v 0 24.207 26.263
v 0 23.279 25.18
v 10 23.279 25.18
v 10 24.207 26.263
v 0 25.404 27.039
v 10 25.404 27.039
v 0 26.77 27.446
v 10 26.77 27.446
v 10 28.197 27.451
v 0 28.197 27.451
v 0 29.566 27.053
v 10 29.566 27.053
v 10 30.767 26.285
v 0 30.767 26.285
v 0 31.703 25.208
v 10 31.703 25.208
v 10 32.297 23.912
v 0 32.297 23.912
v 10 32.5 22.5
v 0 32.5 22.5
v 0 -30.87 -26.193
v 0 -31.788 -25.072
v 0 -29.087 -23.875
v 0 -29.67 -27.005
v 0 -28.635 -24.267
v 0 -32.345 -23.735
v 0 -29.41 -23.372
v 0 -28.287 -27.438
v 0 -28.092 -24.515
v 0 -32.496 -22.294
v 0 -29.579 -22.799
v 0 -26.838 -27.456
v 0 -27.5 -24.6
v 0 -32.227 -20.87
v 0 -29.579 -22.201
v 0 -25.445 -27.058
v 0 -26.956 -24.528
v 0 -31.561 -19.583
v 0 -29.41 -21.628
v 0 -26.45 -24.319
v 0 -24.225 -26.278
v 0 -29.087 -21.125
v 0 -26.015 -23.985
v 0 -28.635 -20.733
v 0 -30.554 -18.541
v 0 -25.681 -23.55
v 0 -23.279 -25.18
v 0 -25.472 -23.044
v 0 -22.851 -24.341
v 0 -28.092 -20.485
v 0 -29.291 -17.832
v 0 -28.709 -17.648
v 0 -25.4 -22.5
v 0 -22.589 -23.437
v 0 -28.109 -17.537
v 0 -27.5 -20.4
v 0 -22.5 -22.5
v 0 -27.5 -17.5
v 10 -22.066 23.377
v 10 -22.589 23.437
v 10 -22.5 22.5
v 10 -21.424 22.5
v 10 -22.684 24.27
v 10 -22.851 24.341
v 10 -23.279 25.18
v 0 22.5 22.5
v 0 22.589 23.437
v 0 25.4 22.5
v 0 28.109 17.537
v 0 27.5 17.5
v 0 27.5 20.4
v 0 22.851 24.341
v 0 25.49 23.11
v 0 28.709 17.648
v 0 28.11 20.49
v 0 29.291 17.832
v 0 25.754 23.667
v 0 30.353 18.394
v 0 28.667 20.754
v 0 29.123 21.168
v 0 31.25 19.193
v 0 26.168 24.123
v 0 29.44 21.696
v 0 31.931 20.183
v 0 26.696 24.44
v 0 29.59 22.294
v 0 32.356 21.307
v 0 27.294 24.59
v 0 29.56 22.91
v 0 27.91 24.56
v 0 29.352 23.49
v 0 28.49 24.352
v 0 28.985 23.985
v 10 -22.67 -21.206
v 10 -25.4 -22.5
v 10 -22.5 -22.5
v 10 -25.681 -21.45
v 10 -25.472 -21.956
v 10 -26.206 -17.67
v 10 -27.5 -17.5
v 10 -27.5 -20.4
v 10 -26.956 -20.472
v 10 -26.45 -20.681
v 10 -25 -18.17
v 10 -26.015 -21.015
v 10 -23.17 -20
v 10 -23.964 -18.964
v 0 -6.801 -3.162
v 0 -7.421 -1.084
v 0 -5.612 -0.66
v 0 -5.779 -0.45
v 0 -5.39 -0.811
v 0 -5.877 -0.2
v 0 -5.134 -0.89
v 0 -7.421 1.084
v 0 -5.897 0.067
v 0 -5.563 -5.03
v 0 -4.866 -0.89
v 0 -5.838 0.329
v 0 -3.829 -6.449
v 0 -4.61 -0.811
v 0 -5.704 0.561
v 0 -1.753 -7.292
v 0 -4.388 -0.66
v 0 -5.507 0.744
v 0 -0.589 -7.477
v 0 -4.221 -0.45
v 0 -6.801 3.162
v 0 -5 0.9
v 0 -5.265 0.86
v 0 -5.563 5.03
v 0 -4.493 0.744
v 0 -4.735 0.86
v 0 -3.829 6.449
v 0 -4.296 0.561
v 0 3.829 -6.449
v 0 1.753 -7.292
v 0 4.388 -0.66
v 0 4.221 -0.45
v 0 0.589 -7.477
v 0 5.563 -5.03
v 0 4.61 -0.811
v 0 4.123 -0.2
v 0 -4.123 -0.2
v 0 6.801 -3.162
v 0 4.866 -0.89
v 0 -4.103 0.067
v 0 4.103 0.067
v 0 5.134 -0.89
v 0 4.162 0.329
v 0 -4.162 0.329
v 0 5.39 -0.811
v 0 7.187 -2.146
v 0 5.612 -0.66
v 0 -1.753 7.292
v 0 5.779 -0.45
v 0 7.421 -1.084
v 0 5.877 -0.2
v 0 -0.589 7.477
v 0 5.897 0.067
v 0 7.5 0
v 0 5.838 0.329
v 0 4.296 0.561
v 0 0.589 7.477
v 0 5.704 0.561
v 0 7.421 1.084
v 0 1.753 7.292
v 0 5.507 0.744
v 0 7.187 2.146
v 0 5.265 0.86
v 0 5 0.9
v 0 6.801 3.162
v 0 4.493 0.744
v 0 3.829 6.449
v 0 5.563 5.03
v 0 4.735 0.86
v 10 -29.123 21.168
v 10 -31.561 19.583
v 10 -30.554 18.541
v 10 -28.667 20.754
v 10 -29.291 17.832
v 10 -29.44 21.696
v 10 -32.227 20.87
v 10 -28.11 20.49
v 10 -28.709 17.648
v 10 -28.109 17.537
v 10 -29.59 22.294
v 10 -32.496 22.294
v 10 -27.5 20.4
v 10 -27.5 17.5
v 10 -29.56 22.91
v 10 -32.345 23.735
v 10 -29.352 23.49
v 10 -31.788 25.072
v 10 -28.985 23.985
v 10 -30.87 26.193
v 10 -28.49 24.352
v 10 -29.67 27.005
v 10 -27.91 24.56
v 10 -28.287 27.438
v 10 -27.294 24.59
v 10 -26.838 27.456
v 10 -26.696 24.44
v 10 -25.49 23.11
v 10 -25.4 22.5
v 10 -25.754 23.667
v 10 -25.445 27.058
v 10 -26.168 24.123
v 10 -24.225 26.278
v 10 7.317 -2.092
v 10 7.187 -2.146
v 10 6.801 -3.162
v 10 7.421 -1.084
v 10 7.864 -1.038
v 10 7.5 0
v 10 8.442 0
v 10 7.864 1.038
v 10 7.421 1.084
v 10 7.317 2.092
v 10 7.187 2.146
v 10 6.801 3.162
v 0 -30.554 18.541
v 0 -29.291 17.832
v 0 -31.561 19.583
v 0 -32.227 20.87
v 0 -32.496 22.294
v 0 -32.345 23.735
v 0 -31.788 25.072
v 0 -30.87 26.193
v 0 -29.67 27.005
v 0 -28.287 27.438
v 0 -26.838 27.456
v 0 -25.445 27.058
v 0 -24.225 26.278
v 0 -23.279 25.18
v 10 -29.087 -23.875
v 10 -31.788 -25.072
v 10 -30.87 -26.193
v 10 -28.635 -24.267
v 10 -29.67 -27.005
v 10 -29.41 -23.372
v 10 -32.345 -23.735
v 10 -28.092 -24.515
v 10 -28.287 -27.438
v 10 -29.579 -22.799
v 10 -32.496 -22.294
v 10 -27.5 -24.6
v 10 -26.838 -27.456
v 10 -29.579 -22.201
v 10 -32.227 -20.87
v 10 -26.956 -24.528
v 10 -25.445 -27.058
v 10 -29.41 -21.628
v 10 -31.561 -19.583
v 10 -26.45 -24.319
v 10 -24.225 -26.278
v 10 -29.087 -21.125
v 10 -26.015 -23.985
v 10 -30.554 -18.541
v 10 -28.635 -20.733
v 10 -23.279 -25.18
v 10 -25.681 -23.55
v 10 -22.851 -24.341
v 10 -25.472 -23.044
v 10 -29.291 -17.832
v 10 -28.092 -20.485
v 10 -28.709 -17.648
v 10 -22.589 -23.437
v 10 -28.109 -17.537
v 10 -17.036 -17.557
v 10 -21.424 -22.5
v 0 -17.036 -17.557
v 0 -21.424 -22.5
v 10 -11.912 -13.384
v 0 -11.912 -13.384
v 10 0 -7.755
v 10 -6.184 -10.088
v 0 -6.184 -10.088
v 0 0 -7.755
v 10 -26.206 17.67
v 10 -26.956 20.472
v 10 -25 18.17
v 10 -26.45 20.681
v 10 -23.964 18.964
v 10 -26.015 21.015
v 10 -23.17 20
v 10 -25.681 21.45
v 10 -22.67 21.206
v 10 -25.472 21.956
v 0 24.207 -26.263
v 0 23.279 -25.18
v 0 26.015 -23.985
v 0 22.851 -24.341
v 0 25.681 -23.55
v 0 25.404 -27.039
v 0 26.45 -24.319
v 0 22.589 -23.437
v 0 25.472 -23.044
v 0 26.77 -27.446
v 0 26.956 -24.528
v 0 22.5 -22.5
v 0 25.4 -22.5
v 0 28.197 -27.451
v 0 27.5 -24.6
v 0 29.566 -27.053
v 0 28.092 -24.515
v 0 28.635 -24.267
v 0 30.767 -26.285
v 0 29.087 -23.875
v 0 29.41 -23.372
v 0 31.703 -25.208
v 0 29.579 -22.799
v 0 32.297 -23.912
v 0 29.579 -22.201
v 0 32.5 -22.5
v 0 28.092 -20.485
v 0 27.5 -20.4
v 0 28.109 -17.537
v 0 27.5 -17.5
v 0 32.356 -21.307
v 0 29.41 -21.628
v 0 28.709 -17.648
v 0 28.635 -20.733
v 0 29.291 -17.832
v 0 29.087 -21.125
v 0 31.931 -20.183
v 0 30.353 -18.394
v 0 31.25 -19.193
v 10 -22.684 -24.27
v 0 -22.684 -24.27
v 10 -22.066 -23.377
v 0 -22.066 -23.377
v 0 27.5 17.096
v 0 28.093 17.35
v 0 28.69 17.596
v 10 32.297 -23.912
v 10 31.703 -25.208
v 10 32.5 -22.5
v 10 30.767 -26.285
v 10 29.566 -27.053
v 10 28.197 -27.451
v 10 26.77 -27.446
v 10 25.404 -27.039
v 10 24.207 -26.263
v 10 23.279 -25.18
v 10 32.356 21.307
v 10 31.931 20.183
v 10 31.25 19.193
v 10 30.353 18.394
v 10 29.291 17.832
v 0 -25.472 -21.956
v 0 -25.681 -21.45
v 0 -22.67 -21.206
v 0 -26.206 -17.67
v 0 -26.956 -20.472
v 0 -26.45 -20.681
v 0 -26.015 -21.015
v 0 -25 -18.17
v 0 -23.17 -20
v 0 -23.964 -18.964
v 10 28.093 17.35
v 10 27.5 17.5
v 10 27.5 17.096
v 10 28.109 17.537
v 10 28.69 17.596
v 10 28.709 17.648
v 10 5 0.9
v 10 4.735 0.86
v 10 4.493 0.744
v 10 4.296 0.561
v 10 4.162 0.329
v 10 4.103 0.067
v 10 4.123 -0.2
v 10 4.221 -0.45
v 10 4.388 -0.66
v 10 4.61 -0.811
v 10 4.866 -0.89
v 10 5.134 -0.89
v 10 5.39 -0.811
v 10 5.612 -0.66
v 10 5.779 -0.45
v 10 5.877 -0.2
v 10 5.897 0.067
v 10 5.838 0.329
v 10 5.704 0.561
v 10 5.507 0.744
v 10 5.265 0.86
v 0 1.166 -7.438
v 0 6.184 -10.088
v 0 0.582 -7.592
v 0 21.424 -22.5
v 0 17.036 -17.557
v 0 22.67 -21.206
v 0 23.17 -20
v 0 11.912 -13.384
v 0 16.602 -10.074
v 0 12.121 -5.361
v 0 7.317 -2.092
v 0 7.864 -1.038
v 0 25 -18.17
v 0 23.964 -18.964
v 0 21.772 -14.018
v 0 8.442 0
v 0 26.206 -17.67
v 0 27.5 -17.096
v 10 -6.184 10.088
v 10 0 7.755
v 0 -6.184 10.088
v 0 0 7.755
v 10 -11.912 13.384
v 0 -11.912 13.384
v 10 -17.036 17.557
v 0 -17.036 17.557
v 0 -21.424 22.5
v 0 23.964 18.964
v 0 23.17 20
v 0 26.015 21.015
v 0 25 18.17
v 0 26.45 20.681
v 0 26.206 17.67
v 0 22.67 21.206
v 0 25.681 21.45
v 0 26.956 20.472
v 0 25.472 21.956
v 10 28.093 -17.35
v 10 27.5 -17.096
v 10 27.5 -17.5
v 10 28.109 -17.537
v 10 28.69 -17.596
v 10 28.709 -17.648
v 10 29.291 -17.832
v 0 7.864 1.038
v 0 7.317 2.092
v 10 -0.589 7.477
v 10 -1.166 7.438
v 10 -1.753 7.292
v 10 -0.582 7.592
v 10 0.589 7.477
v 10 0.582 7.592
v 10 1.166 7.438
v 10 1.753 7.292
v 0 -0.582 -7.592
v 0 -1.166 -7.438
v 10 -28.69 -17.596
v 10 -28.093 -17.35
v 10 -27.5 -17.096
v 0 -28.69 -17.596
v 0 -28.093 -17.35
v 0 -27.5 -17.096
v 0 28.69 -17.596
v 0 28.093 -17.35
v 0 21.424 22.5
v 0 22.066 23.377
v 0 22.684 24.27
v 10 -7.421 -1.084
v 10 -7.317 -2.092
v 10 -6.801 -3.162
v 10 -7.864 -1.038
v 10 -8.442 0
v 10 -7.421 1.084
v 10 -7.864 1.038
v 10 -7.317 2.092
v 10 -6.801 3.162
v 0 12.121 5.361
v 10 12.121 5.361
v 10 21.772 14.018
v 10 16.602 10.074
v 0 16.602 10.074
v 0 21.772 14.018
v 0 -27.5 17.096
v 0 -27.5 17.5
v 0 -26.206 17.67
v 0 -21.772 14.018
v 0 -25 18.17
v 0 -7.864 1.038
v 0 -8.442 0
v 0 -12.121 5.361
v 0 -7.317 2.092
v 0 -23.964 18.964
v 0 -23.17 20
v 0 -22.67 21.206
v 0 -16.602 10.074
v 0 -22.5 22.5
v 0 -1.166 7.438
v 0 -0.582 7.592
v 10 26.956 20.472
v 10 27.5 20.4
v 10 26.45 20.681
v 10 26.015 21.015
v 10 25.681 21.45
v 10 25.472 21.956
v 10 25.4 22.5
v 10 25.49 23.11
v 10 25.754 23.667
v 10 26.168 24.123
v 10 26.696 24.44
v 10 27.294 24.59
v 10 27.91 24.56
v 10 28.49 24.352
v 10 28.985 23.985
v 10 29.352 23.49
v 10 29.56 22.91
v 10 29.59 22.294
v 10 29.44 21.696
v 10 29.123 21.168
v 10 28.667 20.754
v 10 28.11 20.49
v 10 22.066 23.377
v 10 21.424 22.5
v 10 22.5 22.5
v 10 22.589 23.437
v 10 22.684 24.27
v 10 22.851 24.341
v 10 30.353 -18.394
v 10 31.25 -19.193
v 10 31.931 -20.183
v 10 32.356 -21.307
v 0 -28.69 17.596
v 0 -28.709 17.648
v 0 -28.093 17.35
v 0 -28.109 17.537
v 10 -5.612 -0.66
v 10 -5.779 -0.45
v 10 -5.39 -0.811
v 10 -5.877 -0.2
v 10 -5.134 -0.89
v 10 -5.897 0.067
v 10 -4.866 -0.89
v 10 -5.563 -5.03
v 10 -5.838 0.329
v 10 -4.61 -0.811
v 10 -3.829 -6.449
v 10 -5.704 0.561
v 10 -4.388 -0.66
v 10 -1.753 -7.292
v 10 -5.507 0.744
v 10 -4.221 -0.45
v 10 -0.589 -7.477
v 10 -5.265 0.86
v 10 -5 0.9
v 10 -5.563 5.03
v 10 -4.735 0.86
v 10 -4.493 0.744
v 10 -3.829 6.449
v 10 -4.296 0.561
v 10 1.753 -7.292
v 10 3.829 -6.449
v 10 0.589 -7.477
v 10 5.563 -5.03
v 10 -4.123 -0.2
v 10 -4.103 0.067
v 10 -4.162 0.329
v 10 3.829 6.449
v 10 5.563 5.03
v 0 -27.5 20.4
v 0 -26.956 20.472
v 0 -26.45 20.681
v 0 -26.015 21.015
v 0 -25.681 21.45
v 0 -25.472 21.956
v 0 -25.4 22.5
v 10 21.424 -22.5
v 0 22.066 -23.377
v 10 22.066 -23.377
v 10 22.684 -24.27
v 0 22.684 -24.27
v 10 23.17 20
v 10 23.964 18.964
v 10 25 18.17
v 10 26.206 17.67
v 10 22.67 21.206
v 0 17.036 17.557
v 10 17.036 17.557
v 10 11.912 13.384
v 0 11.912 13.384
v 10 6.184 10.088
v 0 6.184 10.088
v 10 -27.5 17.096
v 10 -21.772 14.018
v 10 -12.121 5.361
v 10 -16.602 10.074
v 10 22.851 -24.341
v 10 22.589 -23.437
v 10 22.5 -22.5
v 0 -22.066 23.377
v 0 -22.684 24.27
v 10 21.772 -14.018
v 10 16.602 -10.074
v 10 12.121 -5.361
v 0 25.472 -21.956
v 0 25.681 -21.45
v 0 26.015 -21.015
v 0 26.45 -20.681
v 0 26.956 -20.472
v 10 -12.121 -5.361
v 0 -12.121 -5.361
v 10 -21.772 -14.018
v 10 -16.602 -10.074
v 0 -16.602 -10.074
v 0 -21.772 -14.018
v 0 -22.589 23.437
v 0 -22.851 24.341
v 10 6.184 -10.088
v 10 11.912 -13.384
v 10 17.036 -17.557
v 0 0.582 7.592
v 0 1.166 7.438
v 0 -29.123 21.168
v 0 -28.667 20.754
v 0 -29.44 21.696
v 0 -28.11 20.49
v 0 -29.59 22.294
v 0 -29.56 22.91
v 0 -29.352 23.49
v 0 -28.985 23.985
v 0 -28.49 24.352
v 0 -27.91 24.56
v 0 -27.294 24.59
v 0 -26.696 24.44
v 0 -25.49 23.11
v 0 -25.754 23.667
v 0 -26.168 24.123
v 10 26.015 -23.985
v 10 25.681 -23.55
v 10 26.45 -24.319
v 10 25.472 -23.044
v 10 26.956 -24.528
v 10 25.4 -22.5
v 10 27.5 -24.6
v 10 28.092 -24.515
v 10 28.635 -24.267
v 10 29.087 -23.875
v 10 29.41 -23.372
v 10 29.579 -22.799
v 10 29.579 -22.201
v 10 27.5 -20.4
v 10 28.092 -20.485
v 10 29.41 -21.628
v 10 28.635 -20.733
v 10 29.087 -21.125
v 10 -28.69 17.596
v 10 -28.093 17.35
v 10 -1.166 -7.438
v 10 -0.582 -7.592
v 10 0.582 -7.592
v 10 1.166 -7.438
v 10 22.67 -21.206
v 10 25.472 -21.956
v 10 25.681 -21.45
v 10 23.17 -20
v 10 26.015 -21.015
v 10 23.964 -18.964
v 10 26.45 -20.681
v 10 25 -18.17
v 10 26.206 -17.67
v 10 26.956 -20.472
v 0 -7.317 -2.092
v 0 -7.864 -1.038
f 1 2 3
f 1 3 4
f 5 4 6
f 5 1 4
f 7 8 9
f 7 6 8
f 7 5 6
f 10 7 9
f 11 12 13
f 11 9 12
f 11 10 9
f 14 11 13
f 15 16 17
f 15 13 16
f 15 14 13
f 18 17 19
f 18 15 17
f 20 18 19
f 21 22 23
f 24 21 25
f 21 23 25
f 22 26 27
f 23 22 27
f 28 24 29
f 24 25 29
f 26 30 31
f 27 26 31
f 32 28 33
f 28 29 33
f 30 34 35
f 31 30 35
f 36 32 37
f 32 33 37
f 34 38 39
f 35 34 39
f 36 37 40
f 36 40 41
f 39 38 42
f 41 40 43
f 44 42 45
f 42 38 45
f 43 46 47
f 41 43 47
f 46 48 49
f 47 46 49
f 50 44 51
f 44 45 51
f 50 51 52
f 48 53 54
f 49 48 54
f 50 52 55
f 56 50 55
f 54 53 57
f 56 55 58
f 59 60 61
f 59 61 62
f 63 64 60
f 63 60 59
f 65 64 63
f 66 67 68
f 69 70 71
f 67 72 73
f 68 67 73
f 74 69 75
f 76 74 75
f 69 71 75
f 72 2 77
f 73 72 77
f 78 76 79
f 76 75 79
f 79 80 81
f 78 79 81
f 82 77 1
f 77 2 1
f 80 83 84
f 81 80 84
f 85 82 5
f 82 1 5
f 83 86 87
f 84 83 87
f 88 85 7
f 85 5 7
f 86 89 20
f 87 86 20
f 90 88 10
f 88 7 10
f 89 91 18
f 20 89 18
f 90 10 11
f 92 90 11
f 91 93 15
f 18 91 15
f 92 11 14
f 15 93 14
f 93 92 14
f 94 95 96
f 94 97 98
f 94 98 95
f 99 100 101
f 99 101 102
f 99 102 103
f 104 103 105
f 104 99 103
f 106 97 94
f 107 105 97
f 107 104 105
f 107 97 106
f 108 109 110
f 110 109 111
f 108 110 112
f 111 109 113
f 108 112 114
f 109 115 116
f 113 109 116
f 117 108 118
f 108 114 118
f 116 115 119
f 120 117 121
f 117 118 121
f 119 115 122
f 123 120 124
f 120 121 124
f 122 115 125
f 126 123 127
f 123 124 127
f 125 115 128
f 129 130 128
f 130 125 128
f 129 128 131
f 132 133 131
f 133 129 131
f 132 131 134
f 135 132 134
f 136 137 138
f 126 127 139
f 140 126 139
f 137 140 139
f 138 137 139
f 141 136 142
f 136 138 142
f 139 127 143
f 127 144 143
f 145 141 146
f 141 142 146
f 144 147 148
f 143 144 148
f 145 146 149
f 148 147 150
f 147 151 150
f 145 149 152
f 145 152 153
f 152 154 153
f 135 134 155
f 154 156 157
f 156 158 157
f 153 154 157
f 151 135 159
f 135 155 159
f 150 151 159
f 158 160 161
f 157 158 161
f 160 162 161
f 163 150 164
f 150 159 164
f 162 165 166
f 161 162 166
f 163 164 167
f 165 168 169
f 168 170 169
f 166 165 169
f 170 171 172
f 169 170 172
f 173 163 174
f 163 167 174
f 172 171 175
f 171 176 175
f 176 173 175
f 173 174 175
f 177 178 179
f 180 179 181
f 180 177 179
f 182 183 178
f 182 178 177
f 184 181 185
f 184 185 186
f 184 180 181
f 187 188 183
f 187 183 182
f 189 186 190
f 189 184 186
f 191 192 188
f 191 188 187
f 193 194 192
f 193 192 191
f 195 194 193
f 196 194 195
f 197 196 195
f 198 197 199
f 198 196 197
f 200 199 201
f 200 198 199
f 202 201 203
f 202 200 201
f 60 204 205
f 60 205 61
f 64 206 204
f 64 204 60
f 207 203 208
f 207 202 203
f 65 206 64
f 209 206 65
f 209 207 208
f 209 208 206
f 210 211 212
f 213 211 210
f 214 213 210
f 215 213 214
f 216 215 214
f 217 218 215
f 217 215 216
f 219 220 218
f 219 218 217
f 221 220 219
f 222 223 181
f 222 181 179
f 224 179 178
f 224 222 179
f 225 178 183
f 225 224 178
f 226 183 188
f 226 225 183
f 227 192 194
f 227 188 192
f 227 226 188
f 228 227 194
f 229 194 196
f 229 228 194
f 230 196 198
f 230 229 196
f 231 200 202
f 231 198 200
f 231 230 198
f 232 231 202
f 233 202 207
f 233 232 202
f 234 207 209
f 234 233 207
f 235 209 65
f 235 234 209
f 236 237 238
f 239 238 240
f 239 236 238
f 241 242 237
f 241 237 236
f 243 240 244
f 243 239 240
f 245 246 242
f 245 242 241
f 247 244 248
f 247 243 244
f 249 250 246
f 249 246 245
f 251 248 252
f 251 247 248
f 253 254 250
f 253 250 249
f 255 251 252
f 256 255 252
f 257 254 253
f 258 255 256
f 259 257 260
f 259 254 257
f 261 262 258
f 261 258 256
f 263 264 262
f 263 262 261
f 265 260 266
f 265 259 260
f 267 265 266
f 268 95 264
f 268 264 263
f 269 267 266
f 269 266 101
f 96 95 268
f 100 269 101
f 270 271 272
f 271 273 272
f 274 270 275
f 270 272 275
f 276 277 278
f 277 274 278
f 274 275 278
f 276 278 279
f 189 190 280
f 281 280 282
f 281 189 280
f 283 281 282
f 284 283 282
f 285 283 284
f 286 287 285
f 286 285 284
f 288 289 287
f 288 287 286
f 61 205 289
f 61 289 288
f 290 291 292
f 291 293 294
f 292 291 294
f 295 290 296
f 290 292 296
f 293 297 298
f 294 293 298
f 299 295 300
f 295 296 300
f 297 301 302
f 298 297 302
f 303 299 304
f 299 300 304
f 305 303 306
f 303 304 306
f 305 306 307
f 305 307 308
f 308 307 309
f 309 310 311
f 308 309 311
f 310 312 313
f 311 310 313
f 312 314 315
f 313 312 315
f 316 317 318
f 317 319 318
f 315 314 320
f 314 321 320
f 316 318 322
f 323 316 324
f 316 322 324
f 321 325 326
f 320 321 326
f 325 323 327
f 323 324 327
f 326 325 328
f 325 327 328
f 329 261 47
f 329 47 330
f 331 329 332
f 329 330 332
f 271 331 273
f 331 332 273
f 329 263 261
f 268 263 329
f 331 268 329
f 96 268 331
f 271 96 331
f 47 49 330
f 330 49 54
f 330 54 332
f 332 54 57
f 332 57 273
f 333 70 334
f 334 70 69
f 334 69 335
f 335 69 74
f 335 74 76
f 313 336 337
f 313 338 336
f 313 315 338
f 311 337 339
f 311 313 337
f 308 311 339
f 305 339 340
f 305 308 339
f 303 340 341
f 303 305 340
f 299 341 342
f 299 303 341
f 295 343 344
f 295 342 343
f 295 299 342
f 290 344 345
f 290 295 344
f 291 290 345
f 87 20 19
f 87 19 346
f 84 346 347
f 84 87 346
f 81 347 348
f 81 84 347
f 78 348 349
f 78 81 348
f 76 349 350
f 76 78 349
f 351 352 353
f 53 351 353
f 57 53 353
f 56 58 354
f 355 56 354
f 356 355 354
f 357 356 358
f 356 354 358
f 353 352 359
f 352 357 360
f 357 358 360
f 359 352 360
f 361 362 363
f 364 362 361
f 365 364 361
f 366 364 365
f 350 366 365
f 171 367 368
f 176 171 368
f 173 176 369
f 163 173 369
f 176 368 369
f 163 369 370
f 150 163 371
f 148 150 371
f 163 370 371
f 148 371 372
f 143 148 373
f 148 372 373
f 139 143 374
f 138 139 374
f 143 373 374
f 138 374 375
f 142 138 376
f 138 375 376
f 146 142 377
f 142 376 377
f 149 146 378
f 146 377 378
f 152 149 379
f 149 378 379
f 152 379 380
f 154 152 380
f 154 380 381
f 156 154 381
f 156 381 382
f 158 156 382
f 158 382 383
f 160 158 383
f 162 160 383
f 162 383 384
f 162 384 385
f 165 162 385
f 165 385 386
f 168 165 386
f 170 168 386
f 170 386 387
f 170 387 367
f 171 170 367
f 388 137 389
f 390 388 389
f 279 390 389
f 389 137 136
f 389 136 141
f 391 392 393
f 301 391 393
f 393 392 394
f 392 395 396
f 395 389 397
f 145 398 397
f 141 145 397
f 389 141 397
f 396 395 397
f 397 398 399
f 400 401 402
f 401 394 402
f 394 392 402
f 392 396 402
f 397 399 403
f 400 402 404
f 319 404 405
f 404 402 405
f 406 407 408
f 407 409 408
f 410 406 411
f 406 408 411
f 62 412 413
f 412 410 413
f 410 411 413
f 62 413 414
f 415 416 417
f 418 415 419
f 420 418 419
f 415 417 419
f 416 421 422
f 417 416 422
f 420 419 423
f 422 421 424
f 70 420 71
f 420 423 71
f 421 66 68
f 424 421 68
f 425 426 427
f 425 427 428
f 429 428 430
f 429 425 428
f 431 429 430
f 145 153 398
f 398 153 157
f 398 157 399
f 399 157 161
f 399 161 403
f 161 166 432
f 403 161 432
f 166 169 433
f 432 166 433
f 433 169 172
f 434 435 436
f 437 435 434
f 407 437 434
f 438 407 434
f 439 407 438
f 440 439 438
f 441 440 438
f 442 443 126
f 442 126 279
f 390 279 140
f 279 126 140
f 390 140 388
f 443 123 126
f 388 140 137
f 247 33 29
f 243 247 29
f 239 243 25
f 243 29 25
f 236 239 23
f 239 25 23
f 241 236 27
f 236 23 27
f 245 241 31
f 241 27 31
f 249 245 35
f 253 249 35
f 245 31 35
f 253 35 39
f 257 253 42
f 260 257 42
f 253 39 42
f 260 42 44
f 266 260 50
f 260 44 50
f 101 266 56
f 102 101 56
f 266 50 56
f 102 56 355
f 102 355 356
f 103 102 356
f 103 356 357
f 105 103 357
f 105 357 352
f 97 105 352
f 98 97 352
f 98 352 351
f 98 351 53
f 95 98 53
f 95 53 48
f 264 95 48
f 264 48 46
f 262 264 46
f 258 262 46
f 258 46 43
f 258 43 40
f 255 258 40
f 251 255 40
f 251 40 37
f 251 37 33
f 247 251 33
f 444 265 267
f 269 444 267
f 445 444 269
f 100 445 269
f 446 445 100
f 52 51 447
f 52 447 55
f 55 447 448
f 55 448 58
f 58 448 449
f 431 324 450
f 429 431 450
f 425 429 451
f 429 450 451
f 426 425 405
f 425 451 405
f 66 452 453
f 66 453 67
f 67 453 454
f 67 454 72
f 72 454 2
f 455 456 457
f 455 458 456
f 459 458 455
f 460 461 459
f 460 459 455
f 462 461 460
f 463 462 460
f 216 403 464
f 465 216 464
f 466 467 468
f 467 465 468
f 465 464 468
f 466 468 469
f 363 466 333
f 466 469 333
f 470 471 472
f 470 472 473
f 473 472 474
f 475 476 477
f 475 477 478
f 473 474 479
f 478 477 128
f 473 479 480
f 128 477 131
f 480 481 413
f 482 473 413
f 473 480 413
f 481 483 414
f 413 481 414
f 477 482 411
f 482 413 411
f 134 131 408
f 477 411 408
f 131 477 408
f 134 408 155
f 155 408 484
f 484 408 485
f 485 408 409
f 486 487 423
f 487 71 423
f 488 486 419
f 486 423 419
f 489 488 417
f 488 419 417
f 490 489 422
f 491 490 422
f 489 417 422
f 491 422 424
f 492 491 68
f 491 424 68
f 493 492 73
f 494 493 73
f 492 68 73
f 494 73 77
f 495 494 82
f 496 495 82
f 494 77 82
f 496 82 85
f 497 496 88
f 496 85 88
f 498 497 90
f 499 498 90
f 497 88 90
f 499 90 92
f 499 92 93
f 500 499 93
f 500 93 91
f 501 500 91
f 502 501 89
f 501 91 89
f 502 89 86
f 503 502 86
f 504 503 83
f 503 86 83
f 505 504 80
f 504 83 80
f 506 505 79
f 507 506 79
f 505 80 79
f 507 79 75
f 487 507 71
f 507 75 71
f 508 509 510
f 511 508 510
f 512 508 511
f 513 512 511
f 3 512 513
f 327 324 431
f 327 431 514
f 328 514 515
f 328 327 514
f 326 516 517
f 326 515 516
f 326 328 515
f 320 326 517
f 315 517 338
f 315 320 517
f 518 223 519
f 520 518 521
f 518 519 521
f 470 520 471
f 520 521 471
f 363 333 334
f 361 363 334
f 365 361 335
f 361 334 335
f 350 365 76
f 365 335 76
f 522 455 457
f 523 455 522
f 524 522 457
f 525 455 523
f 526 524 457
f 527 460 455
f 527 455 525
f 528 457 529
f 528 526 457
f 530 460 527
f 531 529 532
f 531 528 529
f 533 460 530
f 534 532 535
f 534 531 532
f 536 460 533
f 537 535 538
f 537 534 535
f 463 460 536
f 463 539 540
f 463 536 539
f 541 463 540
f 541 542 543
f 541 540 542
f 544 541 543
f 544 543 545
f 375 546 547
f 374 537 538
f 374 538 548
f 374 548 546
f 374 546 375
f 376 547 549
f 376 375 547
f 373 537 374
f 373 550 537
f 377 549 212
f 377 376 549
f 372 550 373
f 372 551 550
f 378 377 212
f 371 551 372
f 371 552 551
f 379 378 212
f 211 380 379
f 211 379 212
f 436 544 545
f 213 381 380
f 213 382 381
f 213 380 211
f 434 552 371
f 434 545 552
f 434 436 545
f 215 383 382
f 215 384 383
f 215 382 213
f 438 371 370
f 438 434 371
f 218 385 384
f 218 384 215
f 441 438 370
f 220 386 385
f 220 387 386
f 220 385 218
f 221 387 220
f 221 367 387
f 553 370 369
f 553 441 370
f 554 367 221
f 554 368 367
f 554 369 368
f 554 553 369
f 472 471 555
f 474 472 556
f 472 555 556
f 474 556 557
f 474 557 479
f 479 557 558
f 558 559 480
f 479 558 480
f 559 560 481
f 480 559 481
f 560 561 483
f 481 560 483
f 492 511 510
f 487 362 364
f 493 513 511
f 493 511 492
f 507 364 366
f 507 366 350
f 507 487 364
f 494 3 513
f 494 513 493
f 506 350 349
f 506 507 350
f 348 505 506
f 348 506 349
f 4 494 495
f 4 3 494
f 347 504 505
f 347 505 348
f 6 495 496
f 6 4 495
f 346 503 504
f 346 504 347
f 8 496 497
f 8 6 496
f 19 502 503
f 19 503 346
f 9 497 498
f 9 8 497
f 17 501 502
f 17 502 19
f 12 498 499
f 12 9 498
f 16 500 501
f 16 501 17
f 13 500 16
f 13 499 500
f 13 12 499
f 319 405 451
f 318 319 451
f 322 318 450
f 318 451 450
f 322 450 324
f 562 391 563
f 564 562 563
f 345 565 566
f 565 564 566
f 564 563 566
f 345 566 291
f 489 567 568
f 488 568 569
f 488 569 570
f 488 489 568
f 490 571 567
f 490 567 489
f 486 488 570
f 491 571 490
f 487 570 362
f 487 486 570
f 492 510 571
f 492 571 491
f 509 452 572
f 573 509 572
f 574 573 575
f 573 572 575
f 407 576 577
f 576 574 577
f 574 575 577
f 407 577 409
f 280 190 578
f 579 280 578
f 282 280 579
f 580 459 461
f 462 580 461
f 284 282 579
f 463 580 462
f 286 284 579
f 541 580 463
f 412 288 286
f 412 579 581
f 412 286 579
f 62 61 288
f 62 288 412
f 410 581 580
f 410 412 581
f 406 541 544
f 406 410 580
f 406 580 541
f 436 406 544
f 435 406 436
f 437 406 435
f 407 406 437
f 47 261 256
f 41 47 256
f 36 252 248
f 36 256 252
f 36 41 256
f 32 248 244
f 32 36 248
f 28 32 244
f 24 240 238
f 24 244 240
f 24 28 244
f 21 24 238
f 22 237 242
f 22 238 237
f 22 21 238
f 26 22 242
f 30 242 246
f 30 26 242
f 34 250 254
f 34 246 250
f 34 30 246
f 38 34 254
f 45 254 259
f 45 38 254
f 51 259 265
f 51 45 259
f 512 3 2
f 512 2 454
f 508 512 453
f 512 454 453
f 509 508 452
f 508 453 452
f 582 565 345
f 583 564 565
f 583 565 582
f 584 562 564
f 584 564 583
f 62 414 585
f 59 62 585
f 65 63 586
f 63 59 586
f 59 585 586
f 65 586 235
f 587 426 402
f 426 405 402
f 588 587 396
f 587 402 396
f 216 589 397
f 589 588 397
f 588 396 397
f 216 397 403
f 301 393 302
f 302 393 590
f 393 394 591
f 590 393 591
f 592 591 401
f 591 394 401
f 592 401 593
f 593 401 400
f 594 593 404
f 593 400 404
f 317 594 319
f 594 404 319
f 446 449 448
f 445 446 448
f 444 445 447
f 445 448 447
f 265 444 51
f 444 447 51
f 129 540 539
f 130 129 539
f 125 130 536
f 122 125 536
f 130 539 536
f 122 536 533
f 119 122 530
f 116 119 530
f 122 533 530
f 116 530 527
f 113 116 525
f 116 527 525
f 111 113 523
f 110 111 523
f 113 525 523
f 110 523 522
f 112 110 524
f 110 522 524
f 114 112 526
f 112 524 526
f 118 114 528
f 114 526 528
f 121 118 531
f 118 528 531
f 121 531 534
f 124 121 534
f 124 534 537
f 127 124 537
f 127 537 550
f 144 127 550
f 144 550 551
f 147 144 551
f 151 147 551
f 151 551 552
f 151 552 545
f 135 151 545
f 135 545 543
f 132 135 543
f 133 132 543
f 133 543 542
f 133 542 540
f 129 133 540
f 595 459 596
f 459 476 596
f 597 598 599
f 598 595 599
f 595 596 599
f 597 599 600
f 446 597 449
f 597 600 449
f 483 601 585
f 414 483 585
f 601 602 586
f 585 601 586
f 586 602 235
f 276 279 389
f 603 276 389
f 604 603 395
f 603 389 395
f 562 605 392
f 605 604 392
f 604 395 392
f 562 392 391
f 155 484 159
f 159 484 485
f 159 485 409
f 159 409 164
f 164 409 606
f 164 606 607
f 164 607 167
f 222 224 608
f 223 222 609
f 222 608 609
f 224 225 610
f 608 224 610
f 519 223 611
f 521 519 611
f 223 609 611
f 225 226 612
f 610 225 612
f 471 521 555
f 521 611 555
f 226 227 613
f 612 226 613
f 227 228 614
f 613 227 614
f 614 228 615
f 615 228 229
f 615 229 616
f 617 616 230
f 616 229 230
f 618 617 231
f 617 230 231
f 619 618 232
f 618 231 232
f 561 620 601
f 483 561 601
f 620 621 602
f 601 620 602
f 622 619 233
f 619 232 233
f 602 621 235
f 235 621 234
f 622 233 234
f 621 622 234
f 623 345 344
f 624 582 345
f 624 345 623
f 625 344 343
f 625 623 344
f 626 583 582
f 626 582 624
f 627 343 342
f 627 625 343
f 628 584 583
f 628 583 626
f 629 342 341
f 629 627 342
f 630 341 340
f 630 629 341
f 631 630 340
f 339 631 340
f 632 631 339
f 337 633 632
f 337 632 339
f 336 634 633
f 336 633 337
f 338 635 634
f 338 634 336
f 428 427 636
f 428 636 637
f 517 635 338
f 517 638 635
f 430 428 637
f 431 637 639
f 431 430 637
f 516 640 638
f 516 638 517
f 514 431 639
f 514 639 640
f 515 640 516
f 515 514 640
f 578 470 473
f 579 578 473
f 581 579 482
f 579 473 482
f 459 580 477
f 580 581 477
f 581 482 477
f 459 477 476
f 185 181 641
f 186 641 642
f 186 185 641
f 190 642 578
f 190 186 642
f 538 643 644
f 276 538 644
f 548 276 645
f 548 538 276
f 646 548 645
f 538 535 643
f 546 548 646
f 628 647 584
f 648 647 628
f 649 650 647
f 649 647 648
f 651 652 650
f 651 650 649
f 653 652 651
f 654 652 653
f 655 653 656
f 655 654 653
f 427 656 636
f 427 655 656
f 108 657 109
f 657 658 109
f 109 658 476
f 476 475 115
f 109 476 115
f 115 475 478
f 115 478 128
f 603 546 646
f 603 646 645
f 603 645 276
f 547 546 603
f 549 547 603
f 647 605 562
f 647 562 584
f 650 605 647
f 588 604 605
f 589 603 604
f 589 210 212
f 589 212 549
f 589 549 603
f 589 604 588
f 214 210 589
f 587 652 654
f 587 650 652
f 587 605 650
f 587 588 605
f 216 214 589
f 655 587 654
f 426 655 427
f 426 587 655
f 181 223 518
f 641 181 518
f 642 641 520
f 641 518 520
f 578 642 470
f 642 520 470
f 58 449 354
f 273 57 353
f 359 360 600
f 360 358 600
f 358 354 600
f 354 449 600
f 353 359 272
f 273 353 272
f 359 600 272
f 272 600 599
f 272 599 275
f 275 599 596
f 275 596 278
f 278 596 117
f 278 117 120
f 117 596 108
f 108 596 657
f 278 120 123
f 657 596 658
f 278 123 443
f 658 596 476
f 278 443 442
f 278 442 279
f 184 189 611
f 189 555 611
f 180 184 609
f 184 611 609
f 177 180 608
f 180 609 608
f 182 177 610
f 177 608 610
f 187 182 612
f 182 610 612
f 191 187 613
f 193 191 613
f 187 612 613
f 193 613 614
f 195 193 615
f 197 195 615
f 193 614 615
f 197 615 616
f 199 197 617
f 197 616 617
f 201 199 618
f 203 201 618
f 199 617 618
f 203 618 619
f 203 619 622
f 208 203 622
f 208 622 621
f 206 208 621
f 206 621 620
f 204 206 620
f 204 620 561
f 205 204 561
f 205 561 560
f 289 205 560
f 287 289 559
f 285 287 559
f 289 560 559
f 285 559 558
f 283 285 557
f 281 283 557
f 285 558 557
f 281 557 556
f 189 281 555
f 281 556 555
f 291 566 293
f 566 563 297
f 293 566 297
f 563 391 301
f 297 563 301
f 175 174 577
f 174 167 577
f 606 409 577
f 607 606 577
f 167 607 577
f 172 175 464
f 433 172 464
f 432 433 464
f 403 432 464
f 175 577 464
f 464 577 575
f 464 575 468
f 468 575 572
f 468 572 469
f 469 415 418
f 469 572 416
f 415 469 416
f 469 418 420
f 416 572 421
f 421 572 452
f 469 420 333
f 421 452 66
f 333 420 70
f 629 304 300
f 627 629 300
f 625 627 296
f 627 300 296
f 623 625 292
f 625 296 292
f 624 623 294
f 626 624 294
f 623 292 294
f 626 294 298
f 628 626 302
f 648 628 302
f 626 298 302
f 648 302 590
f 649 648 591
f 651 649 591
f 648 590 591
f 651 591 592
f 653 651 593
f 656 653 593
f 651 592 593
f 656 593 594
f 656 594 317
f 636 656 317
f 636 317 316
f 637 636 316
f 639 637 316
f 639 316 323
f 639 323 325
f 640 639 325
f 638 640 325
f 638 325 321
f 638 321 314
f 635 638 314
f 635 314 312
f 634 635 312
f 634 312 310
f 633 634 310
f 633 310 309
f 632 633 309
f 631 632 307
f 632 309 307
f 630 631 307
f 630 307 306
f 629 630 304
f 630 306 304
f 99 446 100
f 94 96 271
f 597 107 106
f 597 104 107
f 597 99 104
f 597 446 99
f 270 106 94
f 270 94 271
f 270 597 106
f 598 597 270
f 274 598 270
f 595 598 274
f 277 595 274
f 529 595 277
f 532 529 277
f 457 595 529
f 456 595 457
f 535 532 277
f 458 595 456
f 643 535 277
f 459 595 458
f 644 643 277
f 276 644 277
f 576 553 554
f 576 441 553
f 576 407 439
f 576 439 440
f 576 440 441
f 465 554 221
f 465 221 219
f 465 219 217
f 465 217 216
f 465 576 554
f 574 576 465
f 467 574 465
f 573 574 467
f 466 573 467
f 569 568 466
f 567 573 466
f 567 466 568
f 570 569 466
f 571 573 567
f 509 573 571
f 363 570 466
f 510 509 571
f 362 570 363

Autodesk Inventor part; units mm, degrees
ref_plane "YZ Plane" through (0, 0, 0) normal (1, 0, 0) x (0, 1, 0)
ref_plane "XZ Plane" through (0, 0, 0) normal (0, 1, 0) x (-1, 0, 0)
ref_plane "XY Plane" through (0, 0, 0) normal (0, 0, 1) x (1, 0, 0)
sketch "Sketch1" plane through (0, 0, 0) normal (1, 0, 0) x (0, 1, 0)
  line L0 (-27.5, 22.5) -> (27.5, 22.5)
  line L1 (27.5, 22.5) -> (27.5, -22.5)
  line L2 (27.5, -22.5) -> (-27.5, -22.5)
  line L3 (-27.5, -22.5) -> (-27.5, 22.5)
  line L4 (-27.5, 22.5) -> (27.5, -22.5) construction
  line L5 (27.5, 22.5) -> (-27.5, -22.5) construction
  circle A0 centre (27.5, 22.5) radius 5
  circle A1 centre (27.5, -22.5) radius 5
  line L6 (0, -22.5) -> (0, 22.5) construction
  circle A2 centre (0, 0) radius 7.5
  arc A3 (29.2912, 17.8319) -> (6.8009, -3.1619) centre (43.9793, -20.4469) ccw
  arc A4 (-1.7526, 7.2924) -> (23.279, 25.1801) centre (-11.3332, 47.1573) ccw
  line L7 (27.5, 0) -> (-27.5, 0) construction
  arc A5 (6.8009, 3.1619) -> (29.2912, -17.8319) centre (43.9793, 20.4469) ccw
  arc A6 (23.279, -25.1801) -> (-1.7526, -7.2924) centre (-11.3332, -47.1573) ccw
  circle A7 centre (-27.5, 22.5) radius 5
  circle A8 centre (-27.5, -22.5) radius 5
  arc A9 (-6.8009, -3.1619) -> (-29.2912, 17.8319) centre (-43.9793, -20.4469) ccw
  arc A10 (-23.279, 25.1801) -> (1.7526, 7.2924) centre (11.3332, 47.1573) ccw
  arc A11 (-29.2912, -17.8319) -> (-6.8009, 3.1619) centre (-43.9793, 20.4469) ccw
  arc A12 (1.7526, -7.2924) -> (-23.279, -25.1801) centre (11.3332, -47.1573) ccw
  point P0 (23.279, 25.1801)
  point P1 (0, 7.7548)
  point P2 (-23.279, 25.1801)
  point P3 (-8.4416, 0)
  point P4 (-29.2912, -17.8319)
  point P5 (-23.279, -25.1801)
  point P6 (0, -7.7548)
  point P7 (23.279, -25.1801)
  point P8 (29.2912, -17.8319)
  point P9 (8.4416, 0)
  dimension "d3" = 15
  dimension "d0" = 55
  dimension "d1" = 45
  dimension "d2" = 10
  dimension "d4" = 41
extrude "Extrusion1" add sketch "Sketch1" along normal blind 10 contours L3 A7 L0 | L0 A7 L3 | A7 A10 L0 | L0 A10 A4 A2 A11 A9 L3 A7 | L3 A9 A7 | A4 A0 L0 | L0 A0 L1 A3 A5 A2 A10 A4 | A10 A2 A4 | A11 A9 A2 A6 A12 L2 A8 L3 | L3 A8 A11 | A11 A2 A9 | A0 L1 L0 | L0 L1 A0 | A2 | A8 L2 L3 | L3 L2 A8 | A0 A3 L1 | A5 A3 A2 | L2 A12 A8 | A2 A12 A6 | A5 L1 A1 L2 A6 A12 A2 A3 | A5 A1 L1 | L2 A1 A6 | A1 L2 L1 | L1 L2 A1
sketch "Sketch2" plane through (10, 0, 0) normal (1, 0, 0) x (0, 0, -1)
  arc A0 (-25.1801, -23.279) -> (-7.7548, 0) centre (-47.1573, 11.3332) ccw projected
  arc A1 (-25.1801, -23.279) -> (-17.8319, -29.2912) centre (-22.5, -27.5) ccw projected
  arc A2 (0, -8.4416) -> (-17.8319, -29.2912) centre (20.4469, -43.9793) ccw projected
  arc A3 (17.8319, -29.2912) -> (0, -8.4416) centre (-20.4469, -43.9793) ccw projected
  arc A4 (17.8319, -29.2912) -> (25.1801, -23.279) centre (22.5, -27.5) ccw projected
  arc A5 (7.7548, 0) -> (25.1801, -23.279) centre (47.1573, 11.3332) ccw projected
  arc A6 (25.1801, 23.279) -> (7.7548, 0) centre (47.1573, -11.3332) ccw projected
  arc A7 (25.1801, 23.279) -> (17.8319, 29.2912) centre (22.5, 27.5) ccw projected
  arc A8 (0, 8.4416) -> (17.8319, 29.2912) centre (-20.4469, 43.9793) ccw projected
  arc A9 (-17.8319, 29.2912) -> (0, 8.4416) centre (20.4469, 43.9793) ccw projected
  arc A10 (-17.8319, 29.2912) -> (-25.1801, 23.279) centre (-22.5, 27.5) ccw projected
  arc A11 (-7.7548, 0) -> (-25.1801, 23.279) centre (-47.1573, -11.3332) ccw projected
  point P0 (0, 0)
hole "Hole1" at (10, 27.5, 22.5) at (10, -27.5, 22.5) at (10, -27.5, -22.5) at (10, 27.5, -22.5) direction (-1, 0, 0) diameter 4.2 end through all
sketch "Sketch3" plane through (0, 0, 0) normal (-1, 0, 0) x (0, 0, 1)
  line L0 (0, 5) -> (0, -5)
  line L1 (0, 0) -> (4.5458, 0) construction
  dimension "d14" = 10
hole "Hole2" at (0, 5, 0) at (0, -5, 0) direction (1, 0, 0) diameter 1.8 end through all
properties part number "21_Tam_go_trung_gian" material "Stainless Steel, Austenitic"
